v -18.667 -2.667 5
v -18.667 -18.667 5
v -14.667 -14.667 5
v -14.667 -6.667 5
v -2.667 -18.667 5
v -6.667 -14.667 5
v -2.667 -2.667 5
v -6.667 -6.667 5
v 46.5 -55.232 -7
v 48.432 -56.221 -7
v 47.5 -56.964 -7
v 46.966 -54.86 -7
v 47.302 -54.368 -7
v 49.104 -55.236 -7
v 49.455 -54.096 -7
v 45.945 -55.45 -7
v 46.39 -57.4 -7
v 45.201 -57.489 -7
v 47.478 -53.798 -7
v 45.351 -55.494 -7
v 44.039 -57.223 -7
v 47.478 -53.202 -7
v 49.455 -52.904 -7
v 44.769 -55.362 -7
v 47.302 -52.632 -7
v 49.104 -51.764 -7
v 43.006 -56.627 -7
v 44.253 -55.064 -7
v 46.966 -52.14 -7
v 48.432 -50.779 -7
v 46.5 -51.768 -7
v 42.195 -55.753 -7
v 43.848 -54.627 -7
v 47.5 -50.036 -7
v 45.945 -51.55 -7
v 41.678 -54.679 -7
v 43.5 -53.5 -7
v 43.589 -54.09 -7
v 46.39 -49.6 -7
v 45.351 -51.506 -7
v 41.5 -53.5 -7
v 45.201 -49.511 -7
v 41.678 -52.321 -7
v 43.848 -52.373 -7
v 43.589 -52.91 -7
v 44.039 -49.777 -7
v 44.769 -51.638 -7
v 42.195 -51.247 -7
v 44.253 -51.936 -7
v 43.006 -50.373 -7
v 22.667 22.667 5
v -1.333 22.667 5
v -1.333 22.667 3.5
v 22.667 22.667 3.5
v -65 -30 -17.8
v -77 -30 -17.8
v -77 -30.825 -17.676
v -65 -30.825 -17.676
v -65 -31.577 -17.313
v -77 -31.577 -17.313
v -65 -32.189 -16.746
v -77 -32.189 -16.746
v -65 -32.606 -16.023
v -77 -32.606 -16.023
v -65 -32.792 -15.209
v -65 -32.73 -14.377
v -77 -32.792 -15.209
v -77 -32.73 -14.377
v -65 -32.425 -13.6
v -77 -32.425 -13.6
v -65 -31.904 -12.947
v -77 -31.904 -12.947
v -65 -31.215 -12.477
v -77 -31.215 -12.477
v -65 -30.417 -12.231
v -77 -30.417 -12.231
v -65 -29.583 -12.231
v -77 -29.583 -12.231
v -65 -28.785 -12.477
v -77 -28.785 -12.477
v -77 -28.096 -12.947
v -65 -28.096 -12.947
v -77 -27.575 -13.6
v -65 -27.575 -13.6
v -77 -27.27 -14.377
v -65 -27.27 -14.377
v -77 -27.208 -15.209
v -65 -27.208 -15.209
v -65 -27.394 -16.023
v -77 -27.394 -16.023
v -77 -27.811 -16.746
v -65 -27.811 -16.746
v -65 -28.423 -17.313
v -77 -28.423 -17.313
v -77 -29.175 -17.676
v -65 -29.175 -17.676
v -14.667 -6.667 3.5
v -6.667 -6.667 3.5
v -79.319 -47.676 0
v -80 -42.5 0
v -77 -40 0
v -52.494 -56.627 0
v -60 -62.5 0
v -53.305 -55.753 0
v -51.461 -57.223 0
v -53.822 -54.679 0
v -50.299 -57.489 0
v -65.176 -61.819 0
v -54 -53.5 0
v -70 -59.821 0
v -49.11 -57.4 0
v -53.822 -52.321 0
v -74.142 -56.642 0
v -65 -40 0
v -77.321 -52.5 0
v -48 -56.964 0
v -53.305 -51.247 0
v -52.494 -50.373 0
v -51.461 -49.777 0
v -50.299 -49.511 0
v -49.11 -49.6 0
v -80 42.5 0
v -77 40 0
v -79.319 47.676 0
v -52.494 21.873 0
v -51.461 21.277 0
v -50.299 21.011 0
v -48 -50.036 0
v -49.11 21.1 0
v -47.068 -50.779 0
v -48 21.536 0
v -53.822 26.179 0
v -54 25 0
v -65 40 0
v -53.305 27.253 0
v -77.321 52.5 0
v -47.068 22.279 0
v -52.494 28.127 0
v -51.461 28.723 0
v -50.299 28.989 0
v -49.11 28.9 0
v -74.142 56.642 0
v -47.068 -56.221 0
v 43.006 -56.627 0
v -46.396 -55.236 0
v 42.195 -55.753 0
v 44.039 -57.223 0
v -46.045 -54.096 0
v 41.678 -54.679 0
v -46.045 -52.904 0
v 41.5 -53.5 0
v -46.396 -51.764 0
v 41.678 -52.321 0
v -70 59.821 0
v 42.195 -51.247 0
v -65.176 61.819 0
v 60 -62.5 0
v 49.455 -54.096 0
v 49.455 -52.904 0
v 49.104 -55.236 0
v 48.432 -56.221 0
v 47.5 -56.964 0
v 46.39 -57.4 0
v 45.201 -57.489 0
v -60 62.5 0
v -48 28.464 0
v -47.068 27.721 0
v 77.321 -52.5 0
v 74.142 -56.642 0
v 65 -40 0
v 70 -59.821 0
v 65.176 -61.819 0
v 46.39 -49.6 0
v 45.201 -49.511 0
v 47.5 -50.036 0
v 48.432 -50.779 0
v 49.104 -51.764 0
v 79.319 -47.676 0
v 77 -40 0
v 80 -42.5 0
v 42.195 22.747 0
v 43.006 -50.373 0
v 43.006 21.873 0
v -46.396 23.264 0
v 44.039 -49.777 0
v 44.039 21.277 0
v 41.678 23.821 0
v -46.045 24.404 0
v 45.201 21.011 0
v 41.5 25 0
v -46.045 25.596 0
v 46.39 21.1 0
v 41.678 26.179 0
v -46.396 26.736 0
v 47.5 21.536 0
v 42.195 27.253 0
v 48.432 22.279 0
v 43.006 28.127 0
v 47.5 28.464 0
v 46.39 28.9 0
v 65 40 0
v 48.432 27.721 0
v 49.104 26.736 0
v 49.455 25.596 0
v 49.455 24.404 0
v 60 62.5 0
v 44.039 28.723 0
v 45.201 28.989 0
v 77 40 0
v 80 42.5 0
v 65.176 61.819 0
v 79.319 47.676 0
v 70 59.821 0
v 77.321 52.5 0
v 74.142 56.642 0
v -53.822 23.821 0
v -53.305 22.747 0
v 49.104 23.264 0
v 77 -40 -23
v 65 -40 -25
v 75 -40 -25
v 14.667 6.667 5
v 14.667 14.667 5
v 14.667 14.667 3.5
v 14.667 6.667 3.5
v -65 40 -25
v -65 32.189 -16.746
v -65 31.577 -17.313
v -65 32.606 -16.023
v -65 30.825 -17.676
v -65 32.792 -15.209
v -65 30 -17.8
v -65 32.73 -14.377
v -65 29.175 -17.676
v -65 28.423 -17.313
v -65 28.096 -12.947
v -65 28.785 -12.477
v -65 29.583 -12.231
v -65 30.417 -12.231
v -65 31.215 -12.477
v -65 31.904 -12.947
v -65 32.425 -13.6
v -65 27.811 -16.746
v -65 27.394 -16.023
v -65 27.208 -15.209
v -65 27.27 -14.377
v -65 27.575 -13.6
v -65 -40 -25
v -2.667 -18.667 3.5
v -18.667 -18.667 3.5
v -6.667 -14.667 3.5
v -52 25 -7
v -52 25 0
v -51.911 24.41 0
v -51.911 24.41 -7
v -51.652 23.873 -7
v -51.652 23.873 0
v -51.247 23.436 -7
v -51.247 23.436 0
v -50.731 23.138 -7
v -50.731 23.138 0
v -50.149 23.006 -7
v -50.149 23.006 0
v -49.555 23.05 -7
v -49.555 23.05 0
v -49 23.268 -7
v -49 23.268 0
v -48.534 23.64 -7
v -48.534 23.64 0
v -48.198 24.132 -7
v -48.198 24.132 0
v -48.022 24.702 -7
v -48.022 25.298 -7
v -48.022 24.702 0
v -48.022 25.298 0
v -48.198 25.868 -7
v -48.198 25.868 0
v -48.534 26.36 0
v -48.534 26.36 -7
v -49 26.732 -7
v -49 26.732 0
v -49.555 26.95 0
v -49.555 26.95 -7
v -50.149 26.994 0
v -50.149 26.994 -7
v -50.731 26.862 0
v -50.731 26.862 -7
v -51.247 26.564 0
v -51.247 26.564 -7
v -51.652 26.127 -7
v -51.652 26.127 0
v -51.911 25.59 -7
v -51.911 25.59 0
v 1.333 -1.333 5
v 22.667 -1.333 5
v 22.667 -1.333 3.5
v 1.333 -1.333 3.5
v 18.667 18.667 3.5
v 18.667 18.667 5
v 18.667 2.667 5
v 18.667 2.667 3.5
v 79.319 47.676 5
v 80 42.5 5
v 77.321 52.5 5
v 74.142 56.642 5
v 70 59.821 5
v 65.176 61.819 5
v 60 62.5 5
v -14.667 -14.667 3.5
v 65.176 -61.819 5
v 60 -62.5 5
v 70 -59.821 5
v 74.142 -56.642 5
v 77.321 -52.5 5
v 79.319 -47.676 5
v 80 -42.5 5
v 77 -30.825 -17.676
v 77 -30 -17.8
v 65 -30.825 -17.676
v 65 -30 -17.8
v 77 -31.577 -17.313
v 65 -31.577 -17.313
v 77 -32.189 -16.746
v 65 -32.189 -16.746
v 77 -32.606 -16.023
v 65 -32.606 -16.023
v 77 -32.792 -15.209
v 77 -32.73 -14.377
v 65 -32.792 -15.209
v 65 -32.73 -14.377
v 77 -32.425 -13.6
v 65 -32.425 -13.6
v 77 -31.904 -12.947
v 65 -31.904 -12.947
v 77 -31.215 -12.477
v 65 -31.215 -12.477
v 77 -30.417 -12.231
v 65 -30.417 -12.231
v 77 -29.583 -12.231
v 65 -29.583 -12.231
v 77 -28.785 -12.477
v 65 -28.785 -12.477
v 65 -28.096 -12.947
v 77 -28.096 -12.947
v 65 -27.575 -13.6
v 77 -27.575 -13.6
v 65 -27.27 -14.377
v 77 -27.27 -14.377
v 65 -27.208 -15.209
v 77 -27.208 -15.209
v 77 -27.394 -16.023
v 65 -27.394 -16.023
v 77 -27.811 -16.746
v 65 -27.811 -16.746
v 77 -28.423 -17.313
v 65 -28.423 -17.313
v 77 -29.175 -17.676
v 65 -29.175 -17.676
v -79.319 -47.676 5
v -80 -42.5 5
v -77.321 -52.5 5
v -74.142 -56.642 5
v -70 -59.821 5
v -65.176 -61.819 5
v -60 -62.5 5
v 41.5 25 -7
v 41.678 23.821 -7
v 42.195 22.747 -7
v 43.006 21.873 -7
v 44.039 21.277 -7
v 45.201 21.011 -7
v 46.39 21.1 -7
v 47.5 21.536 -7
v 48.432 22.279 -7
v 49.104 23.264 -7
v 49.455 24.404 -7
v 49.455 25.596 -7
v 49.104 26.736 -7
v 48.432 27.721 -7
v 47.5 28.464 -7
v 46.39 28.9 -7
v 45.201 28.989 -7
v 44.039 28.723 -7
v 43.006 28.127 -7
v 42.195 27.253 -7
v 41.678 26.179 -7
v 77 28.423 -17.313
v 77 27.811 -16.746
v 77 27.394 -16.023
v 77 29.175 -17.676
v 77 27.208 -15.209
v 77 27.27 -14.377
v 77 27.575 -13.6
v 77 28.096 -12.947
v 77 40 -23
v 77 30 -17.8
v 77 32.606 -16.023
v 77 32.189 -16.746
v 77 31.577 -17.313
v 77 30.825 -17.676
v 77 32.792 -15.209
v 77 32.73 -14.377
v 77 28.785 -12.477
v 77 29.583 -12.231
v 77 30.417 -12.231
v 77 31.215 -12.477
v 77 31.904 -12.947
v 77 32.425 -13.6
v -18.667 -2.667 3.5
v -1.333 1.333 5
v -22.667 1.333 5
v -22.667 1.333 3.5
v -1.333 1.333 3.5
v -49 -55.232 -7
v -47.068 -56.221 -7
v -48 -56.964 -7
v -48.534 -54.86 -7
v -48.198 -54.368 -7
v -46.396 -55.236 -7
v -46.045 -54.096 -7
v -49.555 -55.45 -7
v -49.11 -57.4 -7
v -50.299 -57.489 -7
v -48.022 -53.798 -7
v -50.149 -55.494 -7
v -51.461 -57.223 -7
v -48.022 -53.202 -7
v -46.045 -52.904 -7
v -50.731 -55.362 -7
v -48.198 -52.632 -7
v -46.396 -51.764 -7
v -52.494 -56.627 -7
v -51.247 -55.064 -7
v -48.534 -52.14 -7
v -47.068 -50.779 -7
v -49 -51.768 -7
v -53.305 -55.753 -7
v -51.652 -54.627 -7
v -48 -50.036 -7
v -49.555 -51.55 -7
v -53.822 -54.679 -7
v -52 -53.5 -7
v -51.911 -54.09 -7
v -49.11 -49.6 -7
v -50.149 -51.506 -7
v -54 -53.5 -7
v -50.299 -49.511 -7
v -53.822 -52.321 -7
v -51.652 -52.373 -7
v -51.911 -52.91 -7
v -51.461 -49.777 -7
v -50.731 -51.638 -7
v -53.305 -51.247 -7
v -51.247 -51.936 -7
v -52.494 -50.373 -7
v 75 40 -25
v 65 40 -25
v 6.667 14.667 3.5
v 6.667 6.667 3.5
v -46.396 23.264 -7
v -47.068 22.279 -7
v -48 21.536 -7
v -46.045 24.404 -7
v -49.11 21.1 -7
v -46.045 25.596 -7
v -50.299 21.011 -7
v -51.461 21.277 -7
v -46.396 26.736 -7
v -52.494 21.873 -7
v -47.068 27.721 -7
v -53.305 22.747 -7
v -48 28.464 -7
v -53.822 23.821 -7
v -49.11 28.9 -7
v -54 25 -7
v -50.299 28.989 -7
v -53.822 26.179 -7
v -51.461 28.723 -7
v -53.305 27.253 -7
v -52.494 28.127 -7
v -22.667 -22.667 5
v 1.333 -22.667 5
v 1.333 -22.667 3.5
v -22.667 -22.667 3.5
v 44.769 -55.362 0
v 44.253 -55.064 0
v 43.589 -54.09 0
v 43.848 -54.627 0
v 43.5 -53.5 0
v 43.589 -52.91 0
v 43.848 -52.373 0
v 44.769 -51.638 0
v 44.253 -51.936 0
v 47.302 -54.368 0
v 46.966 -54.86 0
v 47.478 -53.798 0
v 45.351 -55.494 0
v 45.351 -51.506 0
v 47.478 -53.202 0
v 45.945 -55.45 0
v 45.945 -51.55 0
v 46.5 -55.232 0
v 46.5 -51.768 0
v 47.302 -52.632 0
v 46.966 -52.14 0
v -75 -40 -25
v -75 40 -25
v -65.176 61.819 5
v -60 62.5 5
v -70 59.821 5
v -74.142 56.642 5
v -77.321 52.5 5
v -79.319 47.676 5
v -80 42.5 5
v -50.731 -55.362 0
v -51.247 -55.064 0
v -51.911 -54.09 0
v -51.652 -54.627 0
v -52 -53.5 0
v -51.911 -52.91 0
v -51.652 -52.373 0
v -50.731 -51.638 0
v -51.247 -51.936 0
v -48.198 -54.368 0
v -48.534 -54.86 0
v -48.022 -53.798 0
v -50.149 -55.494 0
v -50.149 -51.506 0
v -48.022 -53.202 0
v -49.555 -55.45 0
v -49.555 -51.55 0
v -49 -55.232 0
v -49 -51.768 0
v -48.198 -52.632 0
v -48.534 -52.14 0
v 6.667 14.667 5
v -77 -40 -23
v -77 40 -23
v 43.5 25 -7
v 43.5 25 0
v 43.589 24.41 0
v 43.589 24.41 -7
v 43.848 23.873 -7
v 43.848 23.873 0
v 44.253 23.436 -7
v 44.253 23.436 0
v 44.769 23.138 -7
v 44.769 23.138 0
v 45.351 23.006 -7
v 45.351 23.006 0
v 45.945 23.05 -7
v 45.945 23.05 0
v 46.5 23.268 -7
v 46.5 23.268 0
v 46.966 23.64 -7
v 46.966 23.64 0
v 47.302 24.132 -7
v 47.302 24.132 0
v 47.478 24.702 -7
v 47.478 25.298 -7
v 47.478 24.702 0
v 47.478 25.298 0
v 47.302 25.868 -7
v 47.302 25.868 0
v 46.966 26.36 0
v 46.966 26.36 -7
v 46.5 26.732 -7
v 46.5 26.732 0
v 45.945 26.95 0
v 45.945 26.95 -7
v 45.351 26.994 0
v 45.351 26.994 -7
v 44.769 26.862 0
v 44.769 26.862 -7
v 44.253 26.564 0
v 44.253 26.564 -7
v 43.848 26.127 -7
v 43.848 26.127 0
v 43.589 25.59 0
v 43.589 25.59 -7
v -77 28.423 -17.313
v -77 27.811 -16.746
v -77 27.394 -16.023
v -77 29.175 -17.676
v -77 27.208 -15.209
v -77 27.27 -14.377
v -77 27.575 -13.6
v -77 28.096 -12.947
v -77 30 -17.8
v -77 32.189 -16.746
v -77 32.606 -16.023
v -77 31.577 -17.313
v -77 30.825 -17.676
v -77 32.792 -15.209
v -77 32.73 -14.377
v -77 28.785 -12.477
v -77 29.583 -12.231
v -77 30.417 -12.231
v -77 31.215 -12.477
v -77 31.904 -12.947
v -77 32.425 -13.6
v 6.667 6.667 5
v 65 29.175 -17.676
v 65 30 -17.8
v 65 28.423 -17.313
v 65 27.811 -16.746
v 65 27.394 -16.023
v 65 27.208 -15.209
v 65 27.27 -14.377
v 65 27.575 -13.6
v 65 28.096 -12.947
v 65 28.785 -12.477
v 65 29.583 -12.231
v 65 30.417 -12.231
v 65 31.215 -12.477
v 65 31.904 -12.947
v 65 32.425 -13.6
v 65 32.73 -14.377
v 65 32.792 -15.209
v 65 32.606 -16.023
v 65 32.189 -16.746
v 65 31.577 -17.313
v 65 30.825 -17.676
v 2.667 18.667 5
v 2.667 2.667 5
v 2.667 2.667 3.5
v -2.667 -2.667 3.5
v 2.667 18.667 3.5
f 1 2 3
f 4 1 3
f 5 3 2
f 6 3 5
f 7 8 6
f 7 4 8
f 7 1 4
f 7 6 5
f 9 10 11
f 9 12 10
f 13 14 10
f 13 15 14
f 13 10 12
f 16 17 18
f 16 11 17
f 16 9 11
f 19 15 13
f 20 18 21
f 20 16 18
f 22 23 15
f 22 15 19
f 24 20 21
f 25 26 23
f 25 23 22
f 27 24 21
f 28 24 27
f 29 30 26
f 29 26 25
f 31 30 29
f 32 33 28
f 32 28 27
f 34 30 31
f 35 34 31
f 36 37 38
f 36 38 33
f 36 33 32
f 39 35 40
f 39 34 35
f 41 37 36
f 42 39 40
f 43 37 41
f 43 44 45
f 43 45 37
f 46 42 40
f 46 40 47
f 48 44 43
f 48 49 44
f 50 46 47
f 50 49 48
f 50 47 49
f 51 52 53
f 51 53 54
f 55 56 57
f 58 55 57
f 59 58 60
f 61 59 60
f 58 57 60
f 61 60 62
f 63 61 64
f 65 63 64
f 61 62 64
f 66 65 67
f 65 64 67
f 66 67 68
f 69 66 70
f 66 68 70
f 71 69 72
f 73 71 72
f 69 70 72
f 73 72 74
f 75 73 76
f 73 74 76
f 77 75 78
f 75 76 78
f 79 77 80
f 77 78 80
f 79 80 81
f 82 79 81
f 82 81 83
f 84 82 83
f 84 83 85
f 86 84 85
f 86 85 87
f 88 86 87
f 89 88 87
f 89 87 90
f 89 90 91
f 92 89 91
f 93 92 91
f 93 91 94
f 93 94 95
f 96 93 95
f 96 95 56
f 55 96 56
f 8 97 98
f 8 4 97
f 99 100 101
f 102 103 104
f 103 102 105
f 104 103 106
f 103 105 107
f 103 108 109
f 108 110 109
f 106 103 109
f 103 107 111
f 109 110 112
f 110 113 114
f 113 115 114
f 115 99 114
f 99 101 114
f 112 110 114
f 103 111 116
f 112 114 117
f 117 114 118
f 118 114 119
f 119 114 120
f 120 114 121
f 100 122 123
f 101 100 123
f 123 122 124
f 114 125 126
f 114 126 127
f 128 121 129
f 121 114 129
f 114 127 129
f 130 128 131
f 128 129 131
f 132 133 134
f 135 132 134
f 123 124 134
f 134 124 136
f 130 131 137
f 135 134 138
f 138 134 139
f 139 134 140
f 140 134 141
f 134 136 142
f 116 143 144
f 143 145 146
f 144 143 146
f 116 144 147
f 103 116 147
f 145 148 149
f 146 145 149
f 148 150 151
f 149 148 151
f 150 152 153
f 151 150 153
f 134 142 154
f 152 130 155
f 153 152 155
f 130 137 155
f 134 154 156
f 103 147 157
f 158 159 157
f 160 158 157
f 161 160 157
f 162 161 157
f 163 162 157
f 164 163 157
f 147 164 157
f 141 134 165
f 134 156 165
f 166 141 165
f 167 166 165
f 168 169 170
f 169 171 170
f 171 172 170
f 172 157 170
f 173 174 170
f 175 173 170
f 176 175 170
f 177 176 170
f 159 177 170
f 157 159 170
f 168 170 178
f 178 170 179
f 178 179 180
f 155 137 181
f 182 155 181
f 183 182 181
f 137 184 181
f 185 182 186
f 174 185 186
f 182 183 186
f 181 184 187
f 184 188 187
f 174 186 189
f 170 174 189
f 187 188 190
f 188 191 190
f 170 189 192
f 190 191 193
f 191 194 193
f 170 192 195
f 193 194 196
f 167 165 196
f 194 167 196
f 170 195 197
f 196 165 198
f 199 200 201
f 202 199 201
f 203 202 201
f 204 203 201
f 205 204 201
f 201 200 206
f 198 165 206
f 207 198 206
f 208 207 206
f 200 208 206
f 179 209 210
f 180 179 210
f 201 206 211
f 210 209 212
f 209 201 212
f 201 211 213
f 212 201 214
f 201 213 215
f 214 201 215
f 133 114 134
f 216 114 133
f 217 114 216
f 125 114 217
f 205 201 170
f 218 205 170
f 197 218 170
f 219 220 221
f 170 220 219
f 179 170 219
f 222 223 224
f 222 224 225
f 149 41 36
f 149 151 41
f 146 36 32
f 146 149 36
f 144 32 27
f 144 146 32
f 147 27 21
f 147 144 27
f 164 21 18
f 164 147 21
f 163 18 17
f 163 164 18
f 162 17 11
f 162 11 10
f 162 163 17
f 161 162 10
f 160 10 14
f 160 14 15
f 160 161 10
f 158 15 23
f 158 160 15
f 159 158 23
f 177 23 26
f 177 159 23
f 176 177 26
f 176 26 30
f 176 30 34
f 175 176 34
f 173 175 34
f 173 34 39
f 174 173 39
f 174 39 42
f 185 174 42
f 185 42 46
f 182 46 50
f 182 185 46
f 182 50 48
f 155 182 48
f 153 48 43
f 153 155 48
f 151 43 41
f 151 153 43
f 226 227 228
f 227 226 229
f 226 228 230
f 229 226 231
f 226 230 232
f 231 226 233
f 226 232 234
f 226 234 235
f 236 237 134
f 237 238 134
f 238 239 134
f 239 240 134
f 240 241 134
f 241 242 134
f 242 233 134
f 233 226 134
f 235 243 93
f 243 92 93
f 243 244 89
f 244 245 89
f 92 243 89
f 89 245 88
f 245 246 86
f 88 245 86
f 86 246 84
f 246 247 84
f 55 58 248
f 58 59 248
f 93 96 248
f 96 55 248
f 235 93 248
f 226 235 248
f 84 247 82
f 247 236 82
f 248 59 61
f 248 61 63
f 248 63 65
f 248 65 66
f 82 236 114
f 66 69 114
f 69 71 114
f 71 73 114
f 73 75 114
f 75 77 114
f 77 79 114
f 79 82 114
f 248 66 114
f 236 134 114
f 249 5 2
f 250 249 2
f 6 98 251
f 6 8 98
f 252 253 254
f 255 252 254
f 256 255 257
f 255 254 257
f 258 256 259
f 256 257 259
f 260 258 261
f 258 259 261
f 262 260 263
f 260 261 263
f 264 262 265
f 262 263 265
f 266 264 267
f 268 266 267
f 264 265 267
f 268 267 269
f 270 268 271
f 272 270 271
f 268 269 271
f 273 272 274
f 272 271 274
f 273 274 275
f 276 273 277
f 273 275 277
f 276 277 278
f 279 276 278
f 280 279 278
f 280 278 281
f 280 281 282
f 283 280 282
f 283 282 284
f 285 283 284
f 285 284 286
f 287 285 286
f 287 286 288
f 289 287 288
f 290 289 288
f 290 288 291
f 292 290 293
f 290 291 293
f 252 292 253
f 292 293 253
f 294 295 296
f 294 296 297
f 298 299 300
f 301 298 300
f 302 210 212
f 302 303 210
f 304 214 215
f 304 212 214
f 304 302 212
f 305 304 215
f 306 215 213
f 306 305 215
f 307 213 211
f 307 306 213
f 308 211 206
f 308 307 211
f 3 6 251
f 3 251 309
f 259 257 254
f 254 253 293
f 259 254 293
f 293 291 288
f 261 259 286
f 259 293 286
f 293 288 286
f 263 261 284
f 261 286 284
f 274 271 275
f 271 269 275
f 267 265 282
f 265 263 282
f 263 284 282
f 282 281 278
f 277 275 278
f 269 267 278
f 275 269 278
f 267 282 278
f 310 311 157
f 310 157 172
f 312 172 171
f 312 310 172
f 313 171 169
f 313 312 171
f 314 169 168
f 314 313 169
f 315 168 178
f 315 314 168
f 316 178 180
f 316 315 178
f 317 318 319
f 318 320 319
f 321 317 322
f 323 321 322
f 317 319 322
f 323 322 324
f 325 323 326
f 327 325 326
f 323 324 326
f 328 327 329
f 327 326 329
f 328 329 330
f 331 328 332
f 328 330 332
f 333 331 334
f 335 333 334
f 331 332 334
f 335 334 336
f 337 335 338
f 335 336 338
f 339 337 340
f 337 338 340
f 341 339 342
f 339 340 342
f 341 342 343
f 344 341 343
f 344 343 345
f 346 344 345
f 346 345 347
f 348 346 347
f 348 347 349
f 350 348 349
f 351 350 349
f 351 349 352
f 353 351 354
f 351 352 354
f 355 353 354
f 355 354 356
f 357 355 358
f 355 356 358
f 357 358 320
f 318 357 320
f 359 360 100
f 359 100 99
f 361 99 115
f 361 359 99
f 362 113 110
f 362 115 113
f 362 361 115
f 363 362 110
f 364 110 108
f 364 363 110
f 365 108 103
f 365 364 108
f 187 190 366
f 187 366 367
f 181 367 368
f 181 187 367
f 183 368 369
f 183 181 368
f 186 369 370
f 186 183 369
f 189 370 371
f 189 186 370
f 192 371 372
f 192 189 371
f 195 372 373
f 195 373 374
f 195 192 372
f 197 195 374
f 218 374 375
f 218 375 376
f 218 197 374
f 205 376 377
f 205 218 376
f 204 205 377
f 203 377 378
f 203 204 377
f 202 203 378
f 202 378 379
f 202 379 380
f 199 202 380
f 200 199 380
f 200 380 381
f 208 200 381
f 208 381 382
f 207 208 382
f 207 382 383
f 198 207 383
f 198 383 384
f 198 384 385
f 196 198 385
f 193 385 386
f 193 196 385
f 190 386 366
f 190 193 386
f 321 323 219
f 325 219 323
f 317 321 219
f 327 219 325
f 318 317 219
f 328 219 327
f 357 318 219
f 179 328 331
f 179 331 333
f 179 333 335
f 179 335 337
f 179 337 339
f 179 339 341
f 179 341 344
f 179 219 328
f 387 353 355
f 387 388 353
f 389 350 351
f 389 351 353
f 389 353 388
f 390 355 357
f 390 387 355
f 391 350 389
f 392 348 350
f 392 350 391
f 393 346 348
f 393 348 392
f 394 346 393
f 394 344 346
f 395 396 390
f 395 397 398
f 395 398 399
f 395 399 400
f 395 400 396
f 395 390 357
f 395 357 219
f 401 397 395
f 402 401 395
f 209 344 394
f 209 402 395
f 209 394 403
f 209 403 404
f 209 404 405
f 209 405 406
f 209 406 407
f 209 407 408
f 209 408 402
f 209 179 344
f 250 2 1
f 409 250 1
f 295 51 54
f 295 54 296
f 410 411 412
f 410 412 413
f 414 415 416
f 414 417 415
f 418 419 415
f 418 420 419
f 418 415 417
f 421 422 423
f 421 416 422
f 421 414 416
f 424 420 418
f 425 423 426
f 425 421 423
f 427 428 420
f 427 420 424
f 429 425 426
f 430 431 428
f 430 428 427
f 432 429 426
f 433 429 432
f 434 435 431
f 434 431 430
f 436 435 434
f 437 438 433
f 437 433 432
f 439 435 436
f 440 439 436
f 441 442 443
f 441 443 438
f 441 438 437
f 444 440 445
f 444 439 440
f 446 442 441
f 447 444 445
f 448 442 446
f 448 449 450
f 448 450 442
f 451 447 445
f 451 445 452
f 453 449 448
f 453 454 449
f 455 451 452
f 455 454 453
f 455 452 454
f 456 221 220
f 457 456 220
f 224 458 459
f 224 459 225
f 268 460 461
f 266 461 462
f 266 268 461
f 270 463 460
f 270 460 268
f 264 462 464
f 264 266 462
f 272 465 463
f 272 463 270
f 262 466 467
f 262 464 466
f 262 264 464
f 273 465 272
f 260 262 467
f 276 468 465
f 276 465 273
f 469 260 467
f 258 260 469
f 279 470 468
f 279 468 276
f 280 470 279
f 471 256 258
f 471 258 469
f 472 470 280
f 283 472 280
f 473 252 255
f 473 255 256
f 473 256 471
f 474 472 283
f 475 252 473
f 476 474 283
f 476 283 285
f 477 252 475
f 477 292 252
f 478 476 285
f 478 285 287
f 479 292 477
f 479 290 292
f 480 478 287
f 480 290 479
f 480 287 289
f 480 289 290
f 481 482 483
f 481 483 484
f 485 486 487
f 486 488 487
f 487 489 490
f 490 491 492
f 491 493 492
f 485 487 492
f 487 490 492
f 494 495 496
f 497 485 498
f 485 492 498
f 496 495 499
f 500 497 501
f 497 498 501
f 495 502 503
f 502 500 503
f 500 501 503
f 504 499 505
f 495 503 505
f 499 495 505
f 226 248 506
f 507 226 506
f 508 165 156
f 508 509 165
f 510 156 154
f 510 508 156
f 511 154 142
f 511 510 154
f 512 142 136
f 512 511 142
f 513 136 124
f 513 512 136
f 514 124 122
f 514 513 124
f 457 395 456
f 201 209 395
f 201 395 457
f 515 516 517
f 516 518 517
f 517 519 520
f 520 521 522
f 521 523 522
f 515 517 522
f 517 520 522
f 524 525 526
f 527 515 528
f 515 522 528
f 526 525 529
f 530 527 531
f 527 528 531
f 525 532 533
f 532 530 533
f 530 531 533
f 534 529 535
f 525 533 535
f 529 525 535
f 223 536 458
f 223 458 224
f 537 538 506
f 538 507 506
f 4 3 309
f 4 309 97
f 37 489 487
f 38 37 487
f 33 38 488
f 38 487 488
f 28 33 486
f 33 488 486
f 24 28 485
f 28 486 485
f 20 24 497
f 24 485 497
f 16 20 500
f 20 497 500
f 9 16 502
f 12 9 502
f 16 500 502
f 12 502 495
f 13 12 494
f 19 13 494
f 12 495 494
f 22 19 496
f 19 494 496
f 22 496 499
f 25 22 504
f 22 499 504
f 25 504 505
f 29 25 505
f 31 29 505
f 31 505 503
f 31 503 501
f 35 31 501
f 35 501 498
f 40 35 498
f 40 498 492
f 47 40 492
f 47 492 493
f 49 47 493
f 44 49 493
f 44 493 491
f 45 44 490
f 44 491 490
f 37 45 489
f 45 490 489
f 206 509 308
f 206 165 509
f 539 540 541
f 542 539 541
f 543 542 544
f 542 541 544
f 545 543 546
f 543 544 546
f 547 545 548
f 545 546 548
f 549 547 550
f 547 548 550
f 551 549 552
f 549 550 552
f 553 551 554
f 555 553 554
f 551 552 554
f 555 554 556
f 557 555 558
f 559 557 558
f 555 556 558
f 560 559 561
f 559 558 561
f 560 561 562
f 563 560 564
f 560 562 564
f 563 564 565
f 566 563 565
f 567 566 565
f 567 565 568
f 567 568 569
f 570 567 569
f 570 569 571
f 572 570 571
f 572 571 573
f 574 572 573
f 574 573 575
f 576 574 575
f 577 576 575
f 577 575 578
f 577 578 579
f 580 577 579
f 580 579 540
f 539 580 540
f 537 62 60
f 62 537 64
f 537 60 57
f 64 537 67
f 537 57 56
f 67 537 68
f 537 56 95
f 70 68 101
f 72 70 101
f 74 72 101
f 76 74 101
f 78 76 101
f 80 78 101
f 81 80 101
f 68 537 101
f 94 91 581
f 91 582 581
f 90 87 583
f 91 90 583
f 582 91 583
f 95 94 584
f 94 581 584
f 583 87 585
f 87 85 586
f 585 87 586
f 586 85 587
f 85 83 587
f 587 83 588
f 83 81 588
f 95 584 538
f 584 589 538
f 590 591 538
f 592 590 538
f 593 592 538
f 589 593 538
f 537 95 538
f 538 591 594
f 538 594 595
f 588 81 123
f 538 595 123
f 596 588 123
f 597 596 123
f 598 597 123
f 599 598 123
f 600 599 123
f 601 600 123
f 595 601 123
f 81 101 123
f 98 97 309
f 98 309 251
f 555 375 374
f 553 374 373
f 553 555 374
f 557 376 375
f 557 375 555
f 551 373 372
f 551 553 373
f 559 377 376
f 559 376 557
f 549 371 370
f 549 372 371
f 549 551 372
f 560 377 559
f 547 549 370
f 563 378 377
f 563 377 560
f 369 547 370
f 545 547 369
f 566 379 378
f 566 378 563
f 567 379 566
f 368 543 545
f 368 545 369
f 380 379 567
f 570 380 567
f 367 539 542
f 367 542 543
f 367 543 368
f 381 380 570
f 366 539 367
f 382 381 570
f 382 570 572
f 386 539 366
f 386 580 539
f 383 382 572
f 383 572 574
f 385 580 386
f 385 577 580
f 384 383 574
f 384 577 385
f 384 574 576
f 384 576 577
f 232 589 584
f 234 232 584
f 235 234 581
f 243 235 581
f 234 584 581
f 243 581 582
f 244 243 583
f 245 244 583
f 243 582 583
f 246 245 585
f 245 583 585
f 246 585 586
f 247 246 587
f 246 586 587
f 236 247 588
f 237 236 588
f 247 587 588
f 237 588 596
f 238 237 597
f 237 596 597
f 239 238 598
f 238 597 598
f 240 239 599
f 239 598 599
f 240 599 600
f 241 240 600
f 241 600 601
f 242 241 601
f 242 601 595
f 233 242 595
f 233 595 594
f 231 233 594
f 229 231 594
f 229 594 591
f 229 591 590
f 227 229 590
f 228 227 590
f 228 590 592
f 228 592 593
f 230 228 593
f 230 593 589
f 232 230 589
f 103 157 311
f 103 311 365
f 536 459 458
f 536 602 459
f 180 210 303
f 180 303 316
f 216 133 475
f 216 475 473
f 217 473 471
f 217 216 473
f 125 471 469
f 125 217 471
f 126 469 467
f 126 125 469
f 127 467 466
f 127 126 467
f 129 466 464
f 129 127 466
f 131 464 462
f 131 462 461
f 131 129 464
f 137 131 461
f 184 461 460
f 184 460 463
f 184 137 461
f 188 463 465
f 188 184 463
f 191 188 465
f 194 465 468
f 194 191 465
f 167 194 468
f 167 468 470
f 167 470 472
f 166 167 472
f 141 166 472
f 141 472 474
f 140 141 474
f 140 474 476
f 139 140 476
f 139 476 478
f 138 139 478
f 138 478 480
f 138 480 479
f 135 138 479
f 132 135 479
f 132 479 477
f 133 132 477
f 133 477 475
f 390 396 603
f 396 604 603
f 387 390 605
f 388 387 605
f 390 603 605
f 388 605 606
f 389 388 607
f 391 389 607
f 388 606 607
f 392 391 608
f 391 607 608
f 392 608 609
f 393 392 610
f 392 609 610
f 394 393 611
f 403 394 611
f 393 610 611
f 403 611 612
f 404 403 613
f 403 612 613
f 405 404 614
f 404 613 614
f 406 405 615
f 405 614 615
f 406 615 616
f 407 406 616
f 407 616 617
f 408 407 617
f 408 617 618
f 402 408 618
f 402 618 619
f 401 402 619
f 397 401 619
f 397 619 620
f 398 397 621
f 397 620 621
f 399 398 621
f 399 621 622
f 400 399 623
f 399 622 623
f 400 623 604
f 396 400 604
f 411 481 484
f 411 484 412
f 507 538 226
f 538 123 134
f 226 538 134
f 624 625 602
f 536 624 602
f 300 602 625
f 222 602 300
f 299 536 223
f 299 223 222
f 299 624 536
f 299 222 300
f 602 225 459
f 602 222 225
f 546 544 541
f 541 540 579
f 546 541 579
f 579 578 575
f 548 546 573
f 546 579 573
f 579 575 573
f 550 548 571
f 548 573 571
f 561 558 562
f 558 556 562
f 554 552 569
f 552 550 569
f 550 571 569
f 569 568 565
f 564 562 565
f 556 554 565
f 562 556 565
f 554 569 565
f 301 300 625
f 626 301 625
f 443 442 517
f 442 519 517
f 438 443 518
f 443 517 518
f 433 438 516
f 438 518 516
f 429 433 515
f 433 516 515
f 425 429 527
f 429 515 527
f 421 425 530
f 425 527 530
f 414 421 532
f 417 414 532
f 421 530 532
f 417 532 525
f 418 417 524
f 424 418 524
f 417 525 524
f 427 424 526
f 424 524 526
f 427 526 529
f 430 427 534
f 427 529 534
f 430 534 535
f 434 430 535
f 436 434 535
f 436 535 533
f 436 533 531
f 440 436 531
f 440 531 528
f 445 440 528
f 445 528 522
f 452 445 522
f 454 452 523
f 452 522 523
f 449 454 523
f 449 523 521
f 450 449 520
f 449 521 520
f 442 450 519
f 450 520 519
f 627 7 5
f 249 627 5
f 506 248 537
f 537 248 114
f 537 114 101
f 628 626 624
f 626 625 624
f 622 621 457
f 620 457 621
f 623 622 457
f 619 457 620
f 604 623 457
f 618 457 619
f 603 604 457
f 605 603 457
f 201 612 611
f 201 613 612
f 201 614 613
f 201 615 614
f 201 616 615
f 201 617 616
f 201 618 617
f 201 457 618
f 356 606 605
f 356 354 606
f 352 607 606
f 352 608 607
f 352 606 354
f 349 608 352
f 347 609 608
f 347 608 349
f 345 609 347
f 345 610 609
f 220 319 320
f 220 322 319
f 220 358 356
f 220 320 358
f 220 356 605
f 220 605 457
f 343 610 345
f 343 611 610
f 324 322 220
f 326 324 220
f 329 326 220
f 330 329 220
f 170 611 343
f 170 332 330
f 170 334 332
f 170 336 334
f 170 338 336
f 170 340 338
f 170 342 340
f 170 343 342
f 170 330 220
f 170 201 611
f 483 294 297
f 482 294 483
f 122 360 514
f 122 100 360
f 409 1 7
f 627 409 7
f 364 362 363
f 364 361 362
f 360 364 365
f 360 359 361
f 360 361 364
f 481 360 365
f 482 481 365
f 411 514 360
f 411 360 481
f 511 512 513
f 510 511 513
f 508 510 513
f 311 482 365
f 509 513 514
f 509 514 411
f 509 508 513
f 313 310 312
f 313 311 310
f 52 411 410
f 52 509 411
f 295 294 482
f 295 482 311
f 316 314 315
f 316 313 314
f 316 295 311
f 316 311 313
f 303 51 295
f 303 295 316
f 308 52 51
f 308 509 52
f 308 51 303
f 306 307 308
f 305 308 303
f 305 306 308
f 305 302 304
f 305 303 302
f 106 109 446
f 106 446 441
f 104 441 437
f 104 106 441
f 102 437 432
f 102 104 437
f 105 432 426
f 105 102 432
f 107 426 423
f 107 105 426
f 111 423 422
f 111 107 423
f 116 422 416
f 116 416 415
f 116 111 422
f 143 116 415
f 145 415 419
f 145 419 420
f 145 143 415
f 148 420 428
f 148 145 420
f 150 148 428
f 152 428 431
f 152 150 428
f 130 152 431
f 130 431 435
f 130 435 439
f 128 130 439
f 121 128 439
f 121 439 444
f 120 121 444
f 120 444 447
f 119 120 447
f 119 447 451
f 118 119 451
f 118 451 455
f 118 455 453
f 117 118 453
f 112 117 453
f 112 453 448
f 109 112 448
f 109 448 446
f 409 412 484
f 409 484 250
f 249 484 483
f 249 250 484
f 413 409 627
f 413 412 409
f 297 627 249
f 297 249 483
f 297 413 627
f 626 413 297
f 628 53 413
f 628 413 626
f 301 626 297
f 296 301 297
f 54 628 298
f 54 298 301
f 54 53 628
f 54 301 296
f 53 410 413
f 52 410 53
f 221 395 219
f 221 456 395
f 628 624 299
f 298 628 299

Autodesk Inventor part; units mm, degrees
ref_plane "YZ Plane" through (0, 0, 0) normal (1, 0, 0) x (0, 1, 0)
ref_plane "XZ Plane" through (0, 0, 0) normal (0, 1, 0) x (-1, 0, 0)
ref_plane "XY Plane" through (0, 0, 0) normal (0, 0, 1) x (1, 0, 0)
sketch "Skizze1" plane through (0, 0, 0) normal (0, 0, 1) x (1, 0, 0)
  line L0 (-80, 62.5) -> (80, 62.5)
  line L1 (80, 62.5) -> (80, -62.5)
  line L2 (80, -62.5) -> (-80, -62.5)
  line L3 (-80, -62.5) -> (-80, 62.5)
  line L4 (-80, 62.5) -> (80, -62.5) construction
  line L5 (80, 62.5) -> (-80, -62.5) construction
  point P0 (0, 0)
  dimension "d0" = 160
  dimension "d1" = 125
extrude "Extrusion1" add sketch "Skizze1" along normal blind 5
fillet "Rundung1" radius 20 4 edges at (80, 62.5, 2.5) (80, -62.5, 2.5) (-80, -62.5, 2.5) (-80, 62.5, 2.5)
sketch "Skizze2" plane through (0, 0, 5) normal (0, 0, 1) x (1, 0, 0)
  line L0 (6.6667, 14.6667) -> (14.6667, 14.6667)
  line L1 (14.6667, 14.6667) -> (14.6667, 6.6667)
  line L2 (14.6667, 6.6667) -> (6.6667, 6.6667)
  line L3 (6.6667, 6.6667) -> (6.6667, 14.6667)
  line L4 (6.6667, 14.6667) -> (14.6667, 6.6667) construction
  line L5 (14.6667, 14.6667) -> (6.6667, 6.6667) construction
  line L6 (2.6667, 18.6667) -> (18.6667, 18.6667)
  line L7 (18.6667, 18.6667) -> (18.6667, 2.6667)
  line L8 (18.6667, 2.6667) -> (2.6667, 2.6667)
  line L9 (2.6667, 2.6667) -> (2.6667, 18.6667)
  line L10 (2.6667, 18.6667) -> (18.6667, 2.6667) construction
  line L11 (18.6667, 18.6667) -> (2.6667, 2.6667) construction
  line L12 (-1.3333, 22.6667) -> (22.6667, 22.6667)
  line L13 (22.6667, 22.6667) -> (22.6667, -1.3333)
  line L14 (22.6667, -1.3333) -> (-1.3333, -1.3333)
  line L15 (-1.3333, -1.3333) -> (-1.3333, 22.6667)
  line L16 (-1.3333, 22.6667) -> (22.6667, -1.3333) construction
  line L17 (22.6667, 22.6667) -> (-1.3333, -1.3333) construction
  line L18 (-10.6667, -10.6667) -> (10.6667, -10.6667) construction
  line L19 (10.6667, -10.6667) -> (10.6667, 10.6667) construction
  line L20 (10.6667, 10.6667) -> (-10.6667, 10.6667) construction
  line L21 (-10.6667, 10.6667) -> (-10.6667, -10.6667) construction
  line L22 (-10.6667, -10.6667) -> (10.6667, 10.6667) construction
  line L23 (10.6667, -10.6667) -> (-10.6667, 10.6667) construction
  line L24 (60, 62.5) -> (-60, 62.5) construction
  line L25 (80, -42.5) -> (80, 42.5) construction
  line L26 (-14.6667, -14.6667) -> (-14.6667, -6.6667)
  line L27 (-14.6667, -6.6667) -> (-6.6667, -6.6667)
  line L28 (-6.6667, -6.6667) -> (-6.6667, -14.6667)
  line L29 (-6.6667, -14.6667) -> (-14.6667, -14.6667)
  line L30 (-6.6667, -6.6667) -> (-14.6667, -14.6667) construction
  line L31 (-2.6667, -2.6667) -> (-2.6667, -18.6667)
  line L32 (-18.6667, -2.6667) -> (-2.6667, -2.6667)
  line L33 (-18.6667, -18.6667) -> (-18.6667, -2.6667)
  line L34 (-2.6667, -18.6667) -> (-18.6667, -18.6667)
  line L35 (-2.6667, -2.6667) -> (-18.6667, -18.6667) construction
  line L36 (-18.6667, -2.6667) -> (-2.6667, -18.6667) construction
  line L37 (1.3333, -22.6667) -> (-22.6667, -22.6667)
  line L38 (-22.6667, 1.3333) -> (1.3333, 1.3333)
  line L39 (-22.6667, -22.6667) -> (-22.6667, 1.3333)
  line L40 (1.3333, 1.3333) -> (1.3333, -22.6667)
  line L41 (-22.6667, 1.3333) -> (1.3333, -22.6667) construction
  line L42 (1.3333, 1.3333) -> (-22.6667, -22.6667) construction
  line L43 (-14.6667, -6.6667) -> (-6.6667, -14.6667) construction
  point P0 (0, 0)
  point P1 (1.3333, -1.3333)
  point P2 (-1.3333, 1.3333)
  dimension "d14" = 8
  dimension "d15" = 8
  dimension "d16" = 16
  dimension "d17" = 16
  dimension "d18" = 24
  dimension "d20" = 21.3333
  dimension "d21" = 21.3333
  dimension "d22" = 62.5
  dimension "d23" = 80
  dimension "d24" = 8
  dimension "d25" = 8
  dimension "d26" = 16
  dimension "d27" = 16
  dimension "d28" = 24
extrude "Extrusion2" cut sketch "Skizze2" against normal blind 1.5
sketch "Skizze3" plane through (0, 0, 0) normal (0, 0, -1) x (-1, 0, 0)
  circle A0 centre (50, -53.5) radius 4
  line L0 (60, -62.5) -> (-60, -62.5) projected
  line L1 (80, 42.5) -> (80, -42.5) projected
  line L2 (50, -53.5) -> (-45.5, -53.5)
  line L3 (-45.5, -53.5) -> (-45.5, 25)
  line L4 (-45.5, 25) -> (50, 25)
  line L5 (50, 25) -> (50, -53.5)
  circle A1 centre (-45.5, -53.5) radius 4
  circle A2 centre (-45.5, 25) radius 4
  circle A3 centre (50, 25) radius 4
  circle A4 centre (-45.5, 25) radius 2
  circle A5 centre (50, 25) radius 2
  circle A6 centre (50, -53.5) radius 2
  circle A7 centre (-45.5, -53.5) radius 2
  point P0 (0, 0)
  dimension "d31" = 9
  dimension "d32" = 30
  dimension "d33" = 8
  dimension "d34" = 78.5
  dimension "d35" = 95.5
  dimension "d36" = 8
  dimension "d37" = 8
  dimension "d38" = 8
  dimension "d39" = 4
  dimension "d40" = 4
  dimension "d41" = 4
  dimension "d42" = 4
extrude "Extrusion3" add sketch "Skizze3" along normal blind 7 contours A0 L2 A6 L5 | L5 A6 L2 A0 | A3 L4 A5 L5 | L5 A5 L4 A3 | A1 L3 A7 L2 | L2 A7 L3 A1 | A2 L3 A4 L4 | L4 A4 L3 A2
sketch "Skizze4" plane through (0, 0, 0) normal (0, 0, -1) x (-1, 0, 0)
  line L0 (-80, -42.5) -> (-80, 42.5) projected
  line L1 (80, 42.5) -> (80, -42.5) projected
  line L2 (-77, 40) -> (-65, 40)
  line L3 (-65, 40) -> (-65, -40)
  line L4 (-65, -40) -> (-77, -40)
  line L5 (-77, -40) -> (-77, 40)
  line L6 (77, 40) -> (65, 40)
  line L7 (65, 40) -> (65, -40)
  line L8 (65, -40) -> (77, -40)
  line L9 (77, -40) -> (77, 40)
  point P0 (0, 0)
  point P1 (-71, 40)
  dimension "d45" = 3
  dimension "d46" = 80
  dimension "d47" = 40
  dimension "d48" = 12
  dimension "d49" = 3
  dimension "d50" = 12
  dimension "d51" = 80
  dimension "d52" = 40
extrude "Extrusion4" add sketch "Skizze4" along normal blind 25
sketch "Skizze5" plane through (77, -40, 0) normal (1, 0, 0) x (0, 0, -1)
  line L0 (0, 0) -> (0, 80) projected
  line L1 (0, 0) -> (25, 0) projected
  line L2 (25, 80) -> (25, 0) projected
  line L3 (0, 80) -> (25, 80) projected
  line L4 (0, -2.5) -> (0, 82.5) projected
  point P0 (0, 40)
  point P1 (15, 70)
  point P2 (15, 10)
  point P3 (0, 40)
  point P4 (0, 40)
  dimension "d55" = 30
  dimension "d56" = 30
  dimension "d57" = 15
  dimension "d58" = 15
hole "Bohrung1" at (77, 30, -15) at (77, -30, -15) direction (-1, 0, 0) diameter 5.6 depth 154
chamfer "Fasen1" distance 2 angle 45 2 edges at (77, 0, -25) (-77, 0, -25)
equation "\"d14\" = d24"
equation "\"d15\" = d14"
equation "\"d16\" = 2 * d14"
equation "\"d17\" = d16"
equation "\"d18\" = 3 * d14"
equation "\"d20\" = 2.66667 * d24"
equation "\"d21\" = d20"
equation "\"d25\" = d24"
equation "\"d26\" = 2 * d24"
equation "\"d27\" = d26"
equation "\"d28\" = 3 * d24"
equation "\"d47\" = 0.5 * d46"
equation "\"d52\" = 0.5 * d51"
properties part number "240_Backplate"
